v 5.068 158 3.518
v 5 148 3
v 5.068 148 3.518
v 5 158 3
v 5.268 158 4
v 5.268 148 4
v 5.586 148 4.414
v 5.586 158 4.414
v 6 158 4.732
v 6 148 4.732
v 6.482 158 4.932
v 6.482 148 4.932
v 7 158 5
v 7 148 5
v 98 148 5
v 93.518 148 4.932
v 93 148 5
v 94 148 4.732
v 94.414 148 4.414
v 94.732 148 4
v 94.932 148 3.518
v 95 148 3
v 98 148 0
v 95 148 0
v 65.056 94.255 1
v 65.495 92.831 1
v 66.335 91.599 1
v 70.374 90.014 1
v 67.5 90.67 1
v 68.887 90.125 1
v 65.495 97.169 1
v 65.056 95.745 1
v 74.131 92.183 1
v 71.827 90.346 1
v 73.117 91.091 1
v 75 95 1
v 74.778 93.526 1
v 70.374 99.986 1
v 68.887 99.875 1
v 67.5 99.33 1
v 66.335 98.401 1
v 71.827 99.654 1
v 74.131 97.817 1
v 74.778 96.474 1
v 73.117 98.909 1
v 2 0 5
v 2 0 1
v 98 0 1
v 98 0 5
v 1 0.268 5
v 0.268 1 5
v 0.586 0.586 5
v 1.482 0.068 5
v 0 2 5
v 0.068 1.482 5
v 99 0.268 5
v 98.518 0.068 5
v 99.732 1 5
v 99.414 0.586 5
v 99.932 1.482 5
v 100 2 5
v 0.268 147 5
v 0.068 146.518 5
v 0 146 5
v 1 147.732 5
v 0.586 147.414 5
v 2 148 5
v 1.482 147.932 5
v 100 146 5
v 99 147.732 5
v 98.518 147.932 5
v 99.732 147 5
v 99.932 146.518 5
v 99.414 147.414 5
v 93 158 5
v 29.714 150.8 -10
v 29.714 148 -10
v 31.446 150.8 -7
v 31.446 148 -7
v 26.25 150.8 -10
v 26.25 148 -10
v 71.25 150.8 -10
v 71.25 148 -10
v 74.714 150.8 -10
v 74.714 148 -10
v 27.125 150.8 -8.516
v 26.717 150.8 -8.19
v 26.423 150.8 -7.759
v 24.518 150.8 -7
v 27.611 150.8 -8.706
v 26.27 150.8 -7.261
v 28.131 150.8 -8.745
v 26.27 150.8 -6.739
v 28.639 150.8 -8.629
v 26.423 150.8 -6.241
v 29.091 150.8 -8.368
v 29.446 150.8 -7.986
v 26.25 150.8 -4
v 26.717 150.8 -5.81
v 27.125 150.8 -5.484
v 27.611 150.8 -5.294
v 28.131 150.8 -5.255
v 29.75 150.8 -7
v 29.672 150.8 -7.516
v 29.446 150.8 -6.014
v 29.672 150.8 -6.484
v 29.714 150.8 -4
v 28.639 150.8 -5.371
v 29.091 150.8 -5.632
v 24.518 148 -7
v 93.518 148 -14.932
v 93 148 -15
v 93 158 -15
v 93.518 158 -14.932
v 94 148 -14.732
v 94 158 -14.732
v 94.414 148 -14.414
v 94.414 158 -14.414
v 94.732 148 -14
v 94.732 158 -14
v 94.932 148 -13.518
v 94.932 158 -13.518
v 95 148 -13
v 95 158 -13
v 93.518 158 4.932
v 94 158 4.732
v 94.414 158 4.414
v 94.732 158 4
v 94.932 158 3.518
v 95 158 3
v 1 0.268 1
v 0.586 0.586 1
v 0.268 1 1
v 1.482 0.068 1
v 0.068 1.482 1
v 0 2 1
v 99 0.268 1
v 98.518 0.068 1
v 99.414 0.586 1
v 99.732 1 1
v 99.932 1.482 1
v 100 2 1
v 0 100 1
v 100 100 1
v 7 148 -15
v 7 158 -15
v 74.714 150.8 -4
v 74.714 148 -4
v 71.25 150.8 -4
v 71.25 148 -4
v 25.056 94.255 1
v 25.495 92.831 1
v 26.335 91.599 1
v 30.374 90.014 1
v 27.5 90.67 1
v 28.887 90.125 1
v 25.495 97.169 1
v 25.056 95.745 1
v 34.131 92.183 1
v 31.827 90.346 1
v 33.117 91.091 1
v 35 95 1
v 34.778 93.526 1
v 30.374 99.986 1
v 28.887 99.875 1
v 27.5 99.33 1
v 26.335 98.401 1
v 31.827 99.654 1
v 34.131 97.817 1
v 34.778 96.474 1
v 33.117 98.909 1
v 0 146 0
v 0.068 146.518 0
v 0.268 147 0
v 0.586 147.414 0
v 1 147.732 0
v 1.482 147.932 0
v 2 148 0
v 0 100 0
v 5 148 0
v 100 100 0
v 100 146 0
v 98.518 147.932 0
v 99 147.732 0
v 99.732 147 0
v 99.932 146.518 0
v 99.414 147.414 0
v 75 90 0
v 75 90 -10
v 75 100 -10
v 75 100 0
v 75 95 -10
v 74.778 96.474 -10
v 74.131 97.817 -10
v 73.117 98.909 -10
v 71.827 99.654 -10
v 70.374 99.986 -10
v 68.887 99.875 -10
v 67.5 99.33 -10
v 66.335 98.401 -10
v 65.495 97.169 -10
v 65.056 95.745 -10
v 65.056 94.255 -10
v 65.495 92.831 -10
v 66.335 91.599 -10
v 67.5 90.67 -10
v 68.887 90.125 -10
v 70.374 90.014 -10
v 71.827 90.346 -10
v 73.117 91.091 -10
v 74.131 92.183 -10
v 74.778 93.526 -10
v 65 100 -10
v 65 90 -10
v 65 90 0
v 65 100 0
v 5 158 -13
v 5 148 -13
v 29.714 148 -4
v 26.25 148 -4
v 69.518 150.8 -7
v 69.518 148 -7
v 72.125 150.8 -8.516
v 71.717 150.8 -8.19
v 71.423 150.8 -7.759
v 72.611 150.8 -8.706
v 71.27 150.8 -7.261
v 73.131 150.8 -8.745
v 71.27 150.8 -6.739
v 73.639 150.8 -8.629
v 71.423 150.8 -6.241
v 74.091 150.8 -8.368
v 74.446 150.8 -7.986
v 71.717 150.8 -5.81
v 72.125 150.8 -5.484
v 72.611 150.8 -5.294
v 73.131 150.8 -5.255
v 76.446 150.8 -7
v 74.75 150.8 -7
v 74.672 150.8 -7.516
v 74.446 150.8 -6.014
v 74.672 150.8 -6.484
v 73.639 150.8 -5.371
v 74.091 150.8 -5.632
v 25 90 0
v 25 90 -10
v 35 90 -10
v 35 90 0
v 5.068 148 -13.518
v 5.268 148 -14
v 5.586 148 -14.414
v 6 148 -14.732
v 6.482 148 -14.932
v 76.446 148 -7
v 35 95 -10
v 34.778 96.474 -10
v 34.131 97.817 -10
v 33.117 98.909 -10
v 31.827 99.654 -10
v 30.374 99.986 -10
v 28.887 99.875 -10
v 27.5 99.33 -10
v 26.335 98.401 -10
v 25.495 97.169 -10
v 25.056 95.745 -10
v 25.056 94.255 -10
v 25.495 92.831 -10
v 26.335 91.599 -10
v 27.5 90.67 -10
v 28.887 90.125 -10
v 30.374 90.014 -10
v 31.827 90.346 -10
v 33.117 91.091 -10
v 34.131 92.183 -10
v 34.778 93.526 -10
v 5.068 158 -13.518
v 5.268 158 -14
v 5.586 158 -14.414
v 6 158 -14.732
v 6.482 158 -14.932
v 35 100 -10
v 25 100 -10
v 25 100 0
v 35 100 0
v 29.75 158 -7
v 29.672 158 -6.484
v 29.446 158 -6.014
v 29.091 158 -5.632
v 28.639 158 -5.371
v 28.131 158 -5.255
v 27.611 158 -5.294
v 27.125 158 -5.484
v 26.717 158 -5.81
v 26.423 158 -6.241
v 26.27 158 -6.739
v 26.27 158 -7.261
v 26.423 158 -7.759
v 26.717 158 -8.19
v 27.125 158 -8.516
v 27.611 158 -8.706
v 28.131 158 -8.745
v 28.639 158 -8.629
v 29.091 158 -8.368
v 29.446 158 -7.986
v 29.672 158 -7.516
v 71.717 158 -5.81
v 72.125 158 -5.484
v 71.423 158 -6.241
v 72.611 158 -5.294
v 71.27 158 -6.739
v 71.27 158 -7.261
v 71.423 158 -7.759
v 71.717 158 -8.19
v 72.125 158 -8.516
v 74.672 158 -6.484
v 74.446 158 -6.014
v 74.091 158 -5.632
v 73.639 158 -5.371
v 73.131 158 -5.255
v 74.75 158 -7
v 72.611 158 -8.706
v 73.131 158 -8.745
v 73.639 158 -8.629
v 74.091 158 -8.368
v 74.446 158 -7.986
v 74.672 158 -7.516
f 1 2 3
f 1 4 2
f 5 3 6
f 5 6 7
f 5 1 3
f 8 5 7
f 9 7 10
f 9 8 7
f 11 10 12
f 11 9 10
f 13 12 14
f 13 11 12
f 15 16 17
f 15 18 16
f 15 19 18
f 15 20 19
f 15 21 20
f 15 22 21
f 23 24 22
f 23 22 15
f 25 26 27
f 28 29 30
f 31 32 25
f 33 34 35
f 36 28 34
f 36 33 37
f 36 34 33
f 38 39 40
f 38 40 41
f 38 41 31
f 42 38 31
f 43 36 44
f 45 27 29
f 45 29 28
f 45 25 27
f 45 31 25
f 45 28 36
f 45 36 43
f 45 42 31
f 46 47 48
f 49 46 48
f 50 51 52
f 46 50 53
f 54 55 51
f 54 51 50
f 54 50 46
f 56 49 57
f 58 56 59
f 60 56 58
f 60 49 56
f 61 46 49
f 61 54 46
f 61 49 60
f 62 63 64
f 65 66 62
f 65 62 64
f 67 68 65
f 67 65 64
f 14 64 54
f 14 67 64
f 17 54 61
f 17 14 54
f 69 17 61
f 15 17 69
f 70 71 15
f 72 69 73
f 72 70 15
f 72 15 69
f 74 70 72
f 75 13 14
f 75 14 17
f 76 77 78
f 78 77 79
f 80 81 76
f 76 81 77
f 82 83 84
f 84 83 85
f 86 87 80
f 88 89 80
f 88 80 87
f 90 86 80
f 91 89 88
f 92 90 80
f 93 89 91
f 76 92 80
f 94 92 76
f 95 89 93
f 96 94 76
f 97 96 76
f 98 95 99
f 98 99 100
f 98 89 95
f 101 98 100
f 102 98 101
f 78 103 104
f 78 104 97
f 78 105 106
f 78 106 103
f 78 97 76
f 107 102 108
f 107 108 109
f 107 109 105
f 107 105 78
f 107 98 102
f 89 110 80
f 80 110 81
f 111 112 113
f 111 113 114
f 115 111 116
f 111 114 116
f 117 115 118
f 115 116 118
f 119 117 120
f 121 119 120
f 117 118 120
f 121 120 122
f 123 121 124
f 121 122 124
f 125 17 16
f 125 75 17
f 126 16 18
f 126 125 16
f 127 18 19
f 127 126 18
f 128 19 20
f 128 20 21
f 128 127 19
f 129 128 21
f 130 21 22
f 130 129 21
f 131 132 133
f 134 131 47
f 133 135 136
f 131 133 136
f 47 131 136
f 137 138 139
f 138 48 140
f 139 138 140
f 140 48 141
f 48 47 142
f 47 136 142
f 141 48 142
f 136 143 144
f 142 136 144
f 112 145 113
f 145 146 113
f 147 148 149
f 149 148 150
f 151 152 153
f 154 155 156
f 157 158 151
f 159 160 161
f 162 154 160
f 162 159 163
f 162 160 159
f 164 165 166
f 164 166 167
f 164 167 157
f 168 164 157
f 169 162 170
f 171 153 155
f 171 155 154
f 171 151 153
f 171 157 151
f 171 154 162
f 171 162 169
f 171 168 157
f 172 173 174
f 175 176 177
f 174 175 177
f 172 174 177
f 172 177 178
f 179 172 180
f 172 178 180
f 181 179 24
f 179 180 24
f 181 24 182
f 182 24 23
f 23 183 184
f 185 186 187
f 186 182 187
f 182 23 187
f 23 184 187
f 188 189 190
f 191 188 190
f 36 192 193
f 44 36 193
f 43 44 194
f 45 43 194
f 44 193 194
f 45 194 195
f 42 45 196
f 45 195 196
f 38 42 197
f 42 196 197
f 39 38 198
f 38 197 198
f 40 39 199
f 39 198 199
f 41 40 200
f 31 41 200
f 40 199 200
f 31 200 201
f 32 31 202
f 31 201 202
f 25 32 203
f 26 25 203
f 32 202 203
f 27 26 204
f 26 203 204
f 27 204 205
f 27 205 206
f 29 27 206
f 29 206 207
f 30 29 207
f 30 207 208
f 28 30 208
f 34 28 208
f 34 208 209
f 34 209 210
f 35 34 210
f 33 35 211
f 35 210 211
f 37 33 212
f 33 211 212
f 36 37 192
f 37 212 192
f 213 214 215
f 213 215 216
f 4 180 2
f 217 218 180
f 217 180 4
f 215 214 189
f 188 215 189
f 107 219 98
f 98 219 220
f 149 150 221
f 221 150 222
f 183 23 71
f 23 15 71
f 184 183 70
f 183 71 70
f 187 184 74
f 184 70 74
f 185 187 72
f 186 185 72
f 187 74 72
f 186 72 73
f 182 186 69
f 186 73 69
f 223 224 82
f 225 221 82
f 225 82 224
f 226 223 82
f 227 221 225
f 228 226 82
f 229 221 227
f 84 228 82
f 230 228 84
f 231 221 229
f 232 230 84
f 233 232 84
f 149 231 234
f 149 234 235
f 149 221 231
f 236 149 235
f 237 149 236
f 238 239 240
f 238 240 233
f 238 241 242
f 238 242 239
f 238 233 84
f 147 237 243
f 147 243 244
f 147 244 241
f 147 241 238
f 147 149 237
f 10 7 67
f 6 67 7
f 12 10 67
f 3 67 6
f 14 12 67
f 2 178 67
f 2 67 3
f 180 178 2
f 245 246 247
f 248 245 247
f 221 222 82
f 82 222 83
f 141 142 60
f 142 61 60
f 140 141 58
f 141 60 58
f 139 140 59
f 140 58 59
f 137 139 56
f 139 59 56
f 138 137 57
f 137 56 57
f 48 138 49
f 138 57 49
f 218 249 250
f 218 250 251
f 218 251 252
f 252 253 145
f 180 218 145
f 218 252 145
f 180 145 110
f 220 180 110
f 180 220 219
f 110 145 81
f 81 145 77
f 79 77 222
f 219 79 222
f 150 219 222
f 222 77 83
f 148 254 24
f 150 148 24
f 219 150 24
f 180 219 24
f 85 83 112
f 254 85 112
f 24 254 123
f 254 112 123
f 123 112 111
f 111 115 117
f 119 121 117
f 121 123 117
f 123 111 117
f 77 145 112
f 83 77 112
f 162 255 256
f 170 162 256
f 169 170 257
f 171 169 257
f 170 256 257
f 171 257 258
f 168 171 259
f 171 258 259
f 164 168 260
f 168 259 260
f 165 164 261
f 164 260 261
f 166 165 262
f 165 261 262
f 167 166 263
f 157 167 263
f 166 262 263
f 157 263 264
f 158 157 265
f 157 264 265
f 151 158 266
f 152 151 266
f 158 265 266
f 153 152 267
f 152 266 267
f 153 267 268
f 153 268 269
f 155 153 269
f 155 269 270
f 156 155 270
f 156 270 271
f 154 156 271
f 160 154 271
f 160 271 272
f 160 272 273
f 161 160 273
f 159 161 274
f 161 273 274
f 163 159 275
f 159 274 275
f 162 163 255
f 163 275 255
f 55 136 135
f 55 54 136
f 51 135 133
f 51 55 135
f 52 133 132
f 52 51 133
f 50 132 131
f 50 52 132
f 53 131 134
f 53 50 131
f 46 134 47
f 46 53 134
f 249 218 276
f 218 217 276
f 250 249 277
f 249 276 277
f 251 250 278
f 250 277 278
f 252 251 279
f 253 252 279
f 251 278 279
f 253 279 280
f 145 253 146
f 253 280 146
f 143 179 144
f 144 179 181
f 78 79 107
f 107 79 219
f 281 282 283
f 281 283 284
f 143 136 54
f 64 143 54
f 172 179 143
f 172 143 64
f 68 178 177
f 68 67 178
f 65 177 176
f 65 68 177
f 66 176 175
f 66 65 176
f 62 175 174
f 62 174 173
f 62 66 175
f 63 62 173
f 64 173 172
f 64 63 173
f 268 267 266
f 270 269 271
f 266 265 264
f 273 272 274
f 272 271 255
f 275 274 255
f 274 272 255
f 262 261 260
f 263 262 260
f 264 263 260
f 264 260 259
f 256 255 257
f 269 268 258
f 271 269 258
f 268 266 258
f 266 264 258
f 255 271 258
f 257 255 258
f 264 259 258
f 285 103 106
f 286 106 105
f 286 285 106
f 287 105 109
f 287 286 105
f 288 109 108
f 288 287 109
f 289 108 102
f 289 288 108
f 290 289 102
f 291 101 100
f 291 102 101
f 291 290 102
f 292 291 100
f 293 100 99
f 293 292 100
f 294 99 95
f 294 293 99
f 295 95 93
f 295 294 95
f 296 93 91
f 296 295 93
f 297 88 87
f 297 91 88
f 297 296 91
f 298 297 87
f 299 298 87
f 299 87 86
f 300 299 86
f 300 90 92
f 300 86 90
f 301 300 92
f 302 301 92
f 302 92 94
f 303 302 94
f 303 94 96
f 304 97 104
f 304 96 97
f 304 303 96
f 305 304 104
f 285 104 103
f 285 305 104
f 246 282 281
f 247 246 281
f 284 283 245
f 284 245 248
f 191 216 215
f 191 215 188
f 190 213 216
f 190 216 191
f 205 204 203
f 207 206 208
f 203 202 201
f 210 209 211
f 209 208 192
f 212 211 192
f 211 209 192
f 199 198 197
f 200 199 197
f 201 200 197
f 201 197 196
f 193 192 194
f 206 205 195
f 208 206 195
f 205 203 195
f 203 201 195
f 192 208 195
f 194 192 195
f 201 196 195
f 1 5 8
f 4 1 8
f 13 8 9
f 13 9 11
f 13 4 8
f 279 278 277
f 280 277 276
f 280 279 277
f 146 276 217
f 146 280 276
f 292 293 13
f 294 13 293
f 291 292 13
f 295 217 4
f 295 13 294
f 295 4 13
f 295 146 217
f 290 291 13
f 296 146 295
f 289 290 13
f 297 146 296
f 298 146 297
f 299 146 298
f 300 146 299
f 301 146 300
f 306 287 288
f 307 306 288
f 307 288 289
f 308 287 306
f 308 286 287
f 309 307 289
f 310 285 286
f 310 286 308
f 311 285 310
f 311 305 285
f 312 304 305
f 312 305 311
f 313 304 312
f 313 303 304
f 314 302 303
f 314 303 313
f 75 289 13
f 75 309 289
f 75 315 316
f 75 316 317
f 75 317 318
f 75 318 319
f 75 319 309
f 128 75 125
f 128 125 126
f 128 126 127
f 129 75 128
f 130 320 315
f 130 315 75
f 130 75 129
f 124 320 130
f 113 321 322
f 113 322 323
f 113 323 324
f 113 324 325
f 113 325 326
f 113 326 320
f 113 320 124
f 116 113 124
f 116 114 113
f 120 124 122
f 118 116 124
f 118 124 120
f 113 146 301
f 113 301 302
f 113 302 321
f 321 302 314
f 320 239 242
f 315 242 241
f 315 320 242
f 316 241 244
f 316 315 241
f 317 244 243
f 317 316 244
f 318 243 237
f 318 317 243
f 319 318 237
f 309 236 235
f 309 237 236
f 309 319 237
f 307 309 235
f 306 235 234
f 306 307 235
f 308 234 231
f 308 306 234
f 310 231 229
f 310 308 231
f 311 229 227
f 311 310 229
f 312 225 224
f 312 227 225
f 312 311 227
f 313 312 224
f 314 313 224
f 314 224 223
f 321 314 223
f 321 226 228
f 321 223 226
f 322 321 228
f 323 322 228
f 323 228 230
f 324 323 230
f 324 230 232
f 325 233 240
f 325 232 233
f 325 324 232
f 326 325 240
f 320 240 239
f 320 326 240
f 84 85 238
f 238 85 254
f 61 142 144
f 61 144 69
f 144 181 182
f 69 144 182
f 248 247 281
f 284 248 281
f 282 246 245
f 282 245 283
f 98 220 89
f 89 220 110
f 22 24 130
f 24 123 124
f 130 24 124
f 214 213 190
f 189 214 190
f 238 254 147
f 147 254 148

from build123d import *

# Parameters (mm, degrees)
BOX003_W               = 10
BOX003_H               = 10
BOX003_DEPTH           = 10
BOX004_W               = 10
BOX004_H               = 10
BOX004_DEPTH           = 10
CYLINDER002_R          = 5
CYLINDER002_DEPTH      = 11
CYLINDER003_R          = 5
CYLINDER003_DEPTH      = 11
BOX001_W               = 100
BOX001_H               = 48
BOX001_DEPTH           = 5
CYLINDER001_R          = 1.75
CYLINDER001_DEPTH      = 10
CYLINDER001_ROLL_ANGLE = 90
CYLINDER_R             = 1.75
CYLINDER_DEPTH         = 10
CYLINDER_ROLL_ANGLE    = 90
PAD001_DEPTH           = 2.8
PAD_DEPTH              = 2.8
BOX002_W               = 90
BOX002_H               = 10
BOX002_DEPTH           = 20
BOX_W                  = 100
BOX_H                  = 100
BOX_DEPTH              = 4
FILLET_R               = 2


with BuildPart() as hood_front1:
    # Box003 → Box003 (new body)
    with BuildSketch(Plane(origin=(25, 90, -10), x_dir=(1, 0, 0), z_dir=(0, 0, 1))):
        with Locations((5, 5)):
            Rectangle(BOX003_W, BOX003_H)
    extrude(amount=BOX003_DEPTH)


with BuildPart() as hood_front2:
    # Box004 → Box004 (new body)
    with BuildSketch(Plane(origin=(65, 90, -10), x_dir=(1, 0, 0), z_dir=(0, 0, 1))):
        with Locations((5, 5)):
            Rectangle(BOX004_W, BOX004_H)
    extrude(amount=BOX004_DEPTH)


with BuildPart() as hood_front3:
    # Cylinder002 → Cylinder002 (new body)
    with BuildSketch(Plane(origin=(30, 95, -10), x_dir=(1, 0, 0), z_dir=(0, 0, 1))):
        Circle(CYLINDER002_R)
    extrude(amount=CYLINDER002_DEPTH)


with BuildPart() as hood_front4:
    # Cylinder003 → Cylinder003 (new body)
    with BuildSketch(Plane(origin=(70, 95, -10), x_dir=(1, 0, 0), z_dir=(0, 0, 1))):
        Circle(CYLINDER003_R)
    extrude(amount=CYLINDER003_DEPTH)


with BuildPart() as hood2:
    # Box001 → Box001 (new body)
    with BuildSketch(Plane(origin=(0, 100, 0), x_dir=(1, 0, 0), z_dir=(0, 0, 1))):
        with Locations((50, 24)):
            Rectangle(BOX001_W, BOX001_H)
    extrude(amount=BOX001_DEPTH)


with BuildPart() as screw2:
    # Cylinder001 → Cylinder001 (new body)
    with BuildSketch(Plane.XY):
        Circle(CYLINDER001_R)
    extrude(amount=CYLINDER001_DEPTH)


with BuildPart() as screw2_1:
    # Cylinder001 roll: moved
    add(screw2.part.rotate(Axis((0, 0, 0), (1, 0, 0)), CYLINDER001_ROLL_ANGLE))


with BuildPart() as screw2_2:
    # Cylinder001 placement: moved
    add(screw2_1.part.moved(Location((73, 158, -7))))


with BuildPart() as fusion001:
    # Cylinder → Cylinder (new body)
    with BuildSketch(Plane.XY):
        Circle(CYLINDER_R)
    extrude(amount=CYLINDER_DEPTH)


with BuildPart() as fusion001_1:
    # Cylinder roll: moved
    add(fusion001.part.rotate(Axis((0, 0, 0), (1, 0, 0)), CYLINDER_ROLL_ANGLE))


with BuildPart() as fusion001_2:
    # Cylinder placement: moved
    add(fusion001_1.part.moved(Location((28, 158, -7))))

    # Fusion001: union Screw2
    add(screw2_2.part)


with BuildPart() as nut2:
    # Sketch001 → Pad001 (new body)
    with BuildSketch(Plane(origin=(50, 148, -15), x_dir=(1, 0, 0), z_dir=(0, -1, 0))):
        Polygon((24.714102, 5), (26.446152, 8), (24.714102, 11), (21.25, 11), (19.517949, 8), (21.25, 5), align=None)
    extrude(amount=-PAD001_DEPTH)


with BuildPart() as fusion:
    # Sketch → Pad (new body)
    with BuildSketch(Plane(origin=(5, 148, -15), x_dir=(1, 0, 0), z_dir=(0, -1, 0))):
        Polygon((24.714102, 5), (26.446152, 8), (24.714102, 11), (21.25, 11), (19.517949, 8), (21.25, 5), align=None)
    extrude(amount=-PAD_DEPTH)

    # Fusion: union Nut2
    add(nut2.part)


with BuildPart() as cut001:
    # Box002 → Box002 (new body)
    with BuildSketch(Plane(origin=(5, 148, -15), x_dir=(1, 0, 0), z_dir=(0, 0, 1))):
        with Locations((45, 5)):
            Rectangle(BOX002_W, BOX002_H)
    extrude(amount=BOX002_DEPTH)

    # Cut: cut Fusion
    add(fusion.part, mode=Mode.SUBTRACT)

    # Cut001: cut Fusion001
    add(fusion001_2.part, mode=Mode.SUBTRACT)


with BuildPart() as fillet_body:
    # Box → Box (new body)
    with BuildSketch(Plane.XY.offset(1)):
        with Locations((50, 50)):
            Rectangle(BOX_W, BOX_H)
    extrude(amount=BOX_DEPTH)

    # Fusion002: union Hood2, Cut001
    add(hood2.part)
    add(cut001.part)

    # Fillet
    fillet_edges = [fillet_body.edges().sort_by_distance(p)[0] for p in [
        (100, 0, 3),
        (0, 0, 3),
        (100, 148, 2.5),
        (0, 148, 2.5),
        (5, 153, 5),
        (95, 153, 5),
        (95, 153, -15),
        (5, 153, -15),
    ]]
    fillet(fillet_edges, radius=FILLET_R)


solid = Compound([hood_front1.part, hood_front2.part, hood_front3.part, hood_front4.part, fillet_body.part])
